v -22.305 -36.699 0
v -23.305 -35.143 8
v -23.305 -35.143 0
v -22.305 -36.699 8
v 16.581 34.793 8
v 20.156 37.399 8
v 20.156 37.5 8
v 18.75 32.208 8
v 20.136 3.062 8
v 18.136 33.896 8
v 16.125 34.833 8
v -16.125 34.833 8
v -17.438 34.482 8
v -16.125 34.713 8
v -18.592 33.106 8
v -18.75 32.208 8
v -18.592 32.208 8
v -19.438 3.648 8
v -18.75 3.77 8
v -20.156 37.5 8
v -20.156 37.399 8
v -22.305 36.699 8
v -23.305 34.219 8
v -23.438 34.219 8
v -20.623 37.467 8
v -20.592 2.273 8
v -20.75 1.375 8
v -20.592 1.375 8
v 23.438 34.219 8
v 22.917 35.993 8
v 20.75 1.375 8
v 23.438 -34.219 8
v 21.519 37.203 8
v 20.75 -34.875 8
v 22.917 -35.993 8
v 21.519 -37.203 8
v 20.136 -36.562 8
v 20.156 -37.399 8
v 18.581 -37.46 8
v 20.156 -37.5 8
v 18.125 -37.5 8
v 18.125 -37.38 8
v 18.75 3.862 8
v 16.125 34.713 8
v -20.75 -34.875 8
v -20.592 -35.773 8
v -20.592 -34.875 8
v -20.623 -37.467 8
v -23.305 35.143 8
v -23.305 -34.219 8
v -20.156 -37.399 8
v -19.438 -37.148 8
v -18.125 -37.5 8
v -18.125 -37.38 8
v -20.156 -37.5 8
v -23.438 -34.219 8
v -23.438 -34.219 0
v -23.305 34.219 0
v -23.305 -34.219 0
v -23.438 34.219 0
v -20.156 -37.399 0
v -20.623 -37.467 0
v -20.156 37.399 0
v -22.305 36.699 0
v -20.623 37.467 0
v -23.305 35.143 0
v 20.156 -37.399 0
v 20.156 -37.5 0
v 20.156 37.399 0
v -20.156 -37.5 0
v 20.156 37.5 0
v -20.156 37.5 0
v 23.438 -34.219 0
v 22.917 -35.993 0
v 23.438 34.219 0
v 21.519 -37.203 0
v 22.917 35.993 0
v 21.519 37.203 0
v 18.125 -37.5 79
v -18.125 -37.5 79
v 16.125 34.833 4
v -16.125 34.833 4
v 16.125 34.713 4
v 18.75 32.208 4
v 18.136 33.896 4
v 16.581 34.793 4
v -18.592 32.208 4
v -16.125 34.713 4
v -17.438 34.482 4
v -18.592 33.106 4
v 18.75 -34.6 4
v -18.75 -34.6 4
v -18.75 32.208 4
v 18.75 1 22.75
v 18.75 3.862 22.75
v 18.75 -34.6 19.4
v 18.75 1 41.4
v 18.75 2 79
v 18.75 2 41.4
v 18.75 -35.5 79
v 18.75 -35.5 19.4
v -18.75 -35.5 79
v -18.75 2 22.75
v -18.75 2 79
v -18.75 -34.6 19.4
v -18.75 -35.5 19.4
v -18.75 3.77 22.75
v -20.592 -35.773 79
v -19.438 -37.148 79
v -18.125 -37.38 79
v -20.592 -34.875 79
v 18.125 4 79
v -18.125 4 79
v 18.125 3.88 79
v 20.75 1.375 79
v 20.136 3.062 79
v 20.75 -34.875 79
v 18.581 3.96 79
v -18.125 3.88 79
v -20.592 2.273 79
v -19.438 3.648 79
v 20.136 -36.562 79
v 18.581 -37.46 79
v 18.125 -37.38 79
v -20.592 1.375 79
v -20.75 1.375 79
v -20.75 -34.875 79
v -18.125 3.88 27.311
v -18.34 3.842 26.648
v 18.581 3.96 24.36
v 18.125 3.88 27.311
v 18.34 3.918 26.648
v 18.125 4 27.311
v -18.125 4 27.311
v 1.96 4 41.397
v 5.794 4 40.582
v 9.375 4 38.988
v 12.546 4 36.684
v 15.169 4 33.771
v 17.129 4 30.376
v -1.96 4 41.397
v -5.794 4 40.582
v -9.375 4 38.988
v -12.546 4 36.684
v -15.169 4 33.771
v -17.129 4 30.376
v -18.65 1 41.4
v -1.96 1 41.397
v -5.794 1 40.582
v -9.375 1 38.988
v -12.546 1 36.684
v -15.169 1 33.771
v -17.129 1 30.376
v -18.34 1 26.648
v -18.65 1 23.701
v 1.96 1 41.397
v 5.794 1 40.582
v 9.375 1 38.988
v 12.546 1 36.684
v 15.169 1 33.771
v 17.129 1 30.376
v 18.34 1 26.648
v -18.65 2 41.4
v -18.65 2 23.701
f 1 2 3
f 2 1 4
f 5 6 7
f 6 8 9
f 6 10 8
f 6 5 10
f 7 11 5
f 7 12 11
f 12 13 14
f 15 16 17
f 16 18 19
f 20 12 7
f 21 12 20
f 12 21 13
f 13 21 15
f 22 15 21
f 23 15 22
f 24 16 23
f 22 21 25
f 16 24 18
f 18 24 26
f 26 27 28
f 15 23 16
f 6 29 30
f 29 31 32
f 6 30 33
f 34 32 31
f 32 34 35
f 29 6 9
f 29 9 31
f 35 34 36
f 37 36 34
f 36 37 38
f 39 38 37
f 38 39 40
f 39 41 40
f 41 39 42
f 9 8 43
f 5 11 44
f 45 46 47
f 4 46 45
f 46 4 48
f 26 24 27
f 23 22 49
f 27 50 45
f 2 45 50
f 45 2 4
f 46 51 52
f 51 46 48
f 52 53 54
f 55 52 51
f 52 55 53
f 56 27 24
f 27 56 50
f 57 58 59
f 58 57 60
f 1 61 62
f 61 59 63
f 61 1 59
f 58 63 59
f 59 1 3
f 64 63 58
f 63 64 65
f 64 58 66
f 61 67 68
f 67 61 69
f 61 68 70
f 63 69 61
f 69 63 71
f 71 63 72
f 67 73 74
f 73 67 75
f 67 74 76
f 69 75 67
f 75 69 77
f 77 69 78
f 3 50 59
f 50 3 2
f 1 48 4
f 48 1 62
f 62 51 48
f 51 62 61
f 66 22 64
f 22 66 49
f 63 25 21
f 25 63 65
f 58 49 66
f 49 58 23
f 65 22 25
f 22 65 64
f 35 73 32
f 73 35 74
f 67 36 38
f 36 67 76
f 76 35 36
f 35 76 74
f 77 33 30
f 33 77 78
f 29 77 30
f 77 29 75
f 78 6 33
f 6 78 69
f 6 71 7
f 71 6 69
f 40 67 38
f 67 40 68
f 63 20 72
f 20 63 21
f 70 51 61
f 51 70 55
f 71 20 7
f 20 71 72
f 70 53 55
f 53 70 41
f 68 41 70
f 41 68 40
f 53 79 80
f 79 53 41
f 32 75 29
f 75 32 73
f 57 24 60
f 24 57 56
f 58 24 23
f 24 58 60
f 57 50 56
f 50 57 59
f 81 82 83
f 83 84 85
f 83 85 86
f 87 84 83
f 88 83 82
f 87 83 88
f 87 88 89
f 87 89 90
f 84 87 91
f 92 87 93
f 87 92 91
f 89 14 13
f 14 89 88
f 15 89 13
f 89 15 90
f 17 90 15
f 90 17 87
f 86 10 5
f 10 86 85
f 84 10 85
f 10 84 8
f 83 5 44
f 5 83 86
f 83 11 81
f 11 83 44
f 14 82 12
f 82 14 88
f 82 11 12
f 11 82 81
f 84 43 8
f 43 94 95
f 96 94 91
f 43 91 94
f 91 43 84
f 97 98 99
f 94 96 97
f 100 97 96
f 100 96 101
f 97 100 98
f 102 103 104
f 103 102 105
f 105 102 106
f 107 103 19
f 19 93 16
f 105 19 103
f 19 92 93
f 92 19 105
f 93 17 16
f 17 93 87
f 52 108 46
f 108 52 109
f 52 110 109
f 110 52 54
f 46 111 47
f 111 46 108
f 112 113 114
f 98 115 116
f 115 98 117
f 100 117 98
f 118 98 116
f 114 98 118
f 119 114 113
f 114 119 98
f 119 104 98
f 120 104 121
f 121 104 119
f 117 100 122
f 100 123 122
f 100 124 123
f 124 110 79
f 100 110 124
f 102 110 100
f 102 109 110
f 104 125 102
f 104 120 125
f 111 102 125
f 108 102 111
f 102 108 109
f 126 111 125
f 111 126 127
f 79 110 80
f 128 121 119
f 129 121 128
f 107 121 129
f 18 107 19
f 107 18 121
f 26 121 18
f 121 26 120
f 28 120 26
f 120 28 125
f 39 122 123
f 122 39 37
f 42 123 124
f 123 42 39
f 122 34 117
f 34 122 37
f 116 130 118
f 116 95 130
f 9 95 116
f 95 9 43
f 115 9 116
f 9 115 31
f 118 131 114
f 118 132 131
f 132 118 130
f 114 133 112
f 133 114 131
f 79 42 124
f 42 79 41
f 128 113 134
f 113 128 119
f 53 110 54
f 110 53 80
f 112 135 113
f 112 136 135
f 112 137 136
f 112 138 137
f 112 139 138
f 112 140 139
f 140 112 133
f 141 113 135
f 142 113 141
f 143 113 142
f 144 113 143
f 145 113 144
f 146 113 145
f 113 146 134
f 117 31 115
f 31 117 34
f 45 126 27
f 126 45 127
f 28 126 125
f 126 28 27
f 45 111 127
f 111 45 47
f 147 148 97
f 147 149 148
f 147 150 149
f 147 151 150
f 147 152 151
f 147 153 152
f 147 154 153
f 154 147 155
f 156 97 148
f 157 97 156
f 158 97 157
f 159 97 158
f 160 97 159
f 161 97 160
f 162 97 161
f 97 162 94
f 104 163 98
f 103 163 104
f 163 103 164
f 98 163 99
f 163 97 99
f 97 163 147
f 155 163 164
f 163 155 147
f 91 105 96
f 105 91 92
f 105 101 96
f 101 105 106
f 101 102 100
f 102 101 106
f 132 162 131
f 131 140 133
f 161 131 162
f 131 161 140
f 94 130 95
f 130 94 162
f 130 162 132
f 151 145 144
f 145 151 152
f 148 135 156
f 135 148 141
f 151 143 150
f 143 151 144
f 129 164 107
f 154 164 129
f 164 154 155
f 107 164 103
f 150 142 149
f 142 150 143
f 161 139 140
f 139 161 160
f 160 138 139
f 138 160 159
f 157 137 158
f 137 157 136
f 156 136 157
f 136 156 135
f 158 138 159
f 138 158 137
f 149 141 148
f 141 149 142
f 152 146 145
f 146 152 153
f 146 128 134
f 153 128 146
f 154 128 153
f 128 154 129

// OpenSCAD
// nespresso coffee pod dispenser

// General parameters
thickness              =  2.0 ; // thickness of plastic
roundedness            =  0.7 ; // roundedness of boxes between 0 and 1
units                  =  1   ; // number of dispensers wide

// Box parameters
box_width              = 37.50; // width of box
box_depth              = 37.50; // depth of box
box_overhang           = 22.00; // overhang on opening

// Base parameters
base_width             = box_width * 1.25;
base_depth             = box_depth * 2;
base_thickness         = thickness * 4;
base_separation        = base_width - (base_width - box_width)/1.4;

use <MCAD/boxes.scad>;

module nespresso_base() {

    difference() {

        // Things that exist
        union() {

            // flat base
            translate( v = [0, 0, base_thickness/2] ) {
                roundedBox( [base_width, base_depth, base_thickness], base_width * roundedness /10, true );
            }

        }

        // Things to be cut out
        union() {

            // tray cut-out from flat base
            translate( v = [0, -thickness/3, base_thickness] ) {
                roundedBox( [box_width, base_depth - thickness * 2, base_thickness], box_width * roundedness/10, true );
            }

            // make back of cut-out square
            translate( v = [0, (base_depth - box_depth - thickness)/-2, base_thickness] ) {
                cube( size = [box_width, box_depth, base_thickness], center = true );
            }


        }
    }

}

module nespresso_base_tube() {

    difference() {

        // Things that exist
        union() {

            // outside of vertical tube
            translate( v = [0, (base_depth - box_depth - thickness * 2)/-2, base_thickness + box_width] ) {
                roundedBox( [box_width + thickness * 2, box_depth + thickness * 2, box_width * 2], box_width * roundedness/10, true );
            }

        }
       
        // Things to be cut out
        union() {
            
            // inside of vertical tube
            difference() {

                // tube
                translate( v = [0, (base_depth - box_depth - thickness * 2)/-2, base_thickness + box_width] ) {
                    cube( size = [box_width, box_depth, box_width*2], center = true );
                }

                // to stop cardboard tube slipping to the bottom
                union() {

                    // front
                    translate( v = [box_width/2 +0.1, thickness/2, base_thickness + box_width -0.1] ) {
                        rotate( a = [0,90,90] ) {
                            linear_extrude(height = thickness/2) polygon( points = [ [0,0], [0,box_width], [box_width, box_width], [box_width,0] ]);
                        }
                    }

                    // back
                    translate( v = [-box_width/2, -box_width + thickness*2 -thickness/2 -0.1, base_thickness -0.1]) {
                        rotate( a = [90,0,0] ) {
                            linear_extrude(height = thickness/2) polygon( points = [ [0,0], [0,box_width - box_overhang], [box_width, box_width - box_overhang], [box_width,0] ]);
                        }
                    }

                }

            }

            // archway - arch
            translate( v = [0, thickness, base_thickness + box_width/2] ) {
                rotate( a = [90, 0, 0] ) {
                    # cylinder( h = thickness *2, r = box_width/2, center = true );
                }
            }

            // archway - square
            translate( v = [0, thickness, base_thickness + box_width/2/2] ) {
                # cube( size = [box_width, thickness * 2, box_width/2], center = true );
                
            }


        }

    }

}

union() {
    for (z = [ base_separation : base_separation : units * base_separation ] ) {
        translate( v = [z - (units/2 * base_separation) - base_separation/2, 0, 0]) {
            nespresso_base();
            translate( v = [0,0,-base_thickness/2]) {
                nespresso_base_tube();
            }
        }
    }
}
